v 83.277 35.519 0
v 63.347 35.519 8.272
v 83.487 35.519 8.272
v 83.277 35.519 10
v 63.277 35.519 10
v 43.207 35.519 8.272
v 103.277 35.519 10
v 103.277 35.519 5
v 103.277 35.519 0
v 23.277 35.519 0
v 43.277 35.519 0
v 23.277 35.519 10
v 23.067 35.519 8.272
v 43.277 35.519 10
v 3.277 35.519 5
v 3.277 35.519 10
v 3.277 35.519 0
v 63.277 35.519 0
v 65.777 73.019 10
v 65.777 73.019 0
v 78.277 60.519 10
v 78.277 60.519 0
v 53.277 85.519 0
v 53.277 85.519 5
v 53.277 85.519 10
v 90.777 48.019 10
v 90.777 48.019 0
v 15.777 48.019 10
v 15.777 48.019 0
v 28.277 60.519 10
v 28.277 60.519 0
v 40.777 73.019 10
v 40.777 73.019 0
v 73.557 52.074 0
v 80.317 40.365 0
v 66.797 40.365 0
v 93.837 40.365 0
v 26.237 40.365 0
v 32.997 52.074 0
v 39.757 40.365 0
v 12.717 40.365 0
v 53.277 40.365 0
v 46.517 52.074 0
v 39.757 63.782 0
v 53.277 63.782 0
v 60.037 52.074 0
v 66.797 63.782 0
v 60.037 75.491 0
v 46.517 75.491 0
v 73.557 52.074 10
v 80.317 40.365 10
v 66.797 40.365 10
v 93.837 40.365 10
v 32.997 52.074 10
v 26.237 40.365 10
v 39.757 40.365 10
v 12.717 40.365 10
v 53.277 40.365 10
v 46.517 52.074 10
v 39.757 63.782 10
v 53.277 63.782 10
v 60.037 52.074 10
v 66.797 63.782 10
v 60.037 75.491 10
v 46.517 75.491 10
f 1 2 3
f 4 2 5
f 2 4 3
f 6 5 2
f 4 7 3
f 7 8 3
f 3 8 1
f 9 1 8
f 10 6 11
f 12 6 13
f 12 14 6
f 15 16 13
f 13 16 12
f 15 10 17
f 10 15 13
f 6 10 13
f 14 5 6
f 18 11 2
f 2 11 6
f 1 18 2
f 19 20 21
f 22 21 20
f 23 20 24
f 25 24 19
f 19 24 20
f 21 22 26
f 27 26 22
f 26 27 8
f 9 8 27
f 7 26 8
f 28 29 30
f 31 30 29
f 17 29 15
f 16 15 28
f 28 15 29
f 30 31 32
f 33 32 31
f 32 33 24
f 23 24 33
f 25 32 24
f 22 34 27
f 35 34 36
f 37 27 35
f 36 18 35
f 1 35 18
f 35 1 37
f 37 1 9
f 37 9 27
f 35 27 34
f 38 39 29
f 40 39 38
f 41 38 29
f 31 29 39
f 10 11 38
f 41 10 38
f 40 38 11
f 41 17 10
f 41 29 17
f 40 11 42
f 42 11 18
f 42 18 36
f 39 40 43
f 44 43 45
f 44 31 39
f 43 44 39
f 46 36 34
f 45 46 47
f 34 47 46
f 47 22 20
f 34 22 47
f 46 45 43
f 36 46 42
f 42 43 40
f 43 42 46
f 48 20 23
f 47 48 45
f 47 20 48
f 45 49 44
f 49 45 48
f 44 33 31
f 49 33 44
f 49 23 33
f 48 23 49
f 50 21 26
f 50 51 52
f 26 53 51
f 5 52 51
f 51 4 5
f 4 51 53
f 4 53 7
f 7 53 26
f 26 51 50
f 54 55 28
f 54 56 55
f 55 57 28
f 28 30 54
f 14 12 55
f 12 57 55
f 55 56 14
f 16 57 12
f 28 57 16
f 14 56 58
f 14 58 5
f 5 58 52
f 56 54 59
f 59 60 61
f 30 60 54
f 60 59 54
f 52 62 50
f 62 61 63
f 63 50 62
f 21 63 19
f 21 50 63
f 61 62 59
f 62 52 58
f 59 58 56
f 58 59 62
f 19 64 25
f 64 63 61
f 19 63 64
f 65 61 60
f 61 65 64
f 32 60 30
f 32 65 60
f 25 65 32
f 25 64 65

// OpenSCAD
// CSG file generated from FreeCAD 0.20.29177 (Git)
group() {
 group(){
polyhedron ( points = [[3.276663,35.518578,0.000000],[3.276663,35.518578,10.000000],[103.276665,35.518578,0.000000],[103.276665,35.518578,10.000000],[53.276665,85.518578,0.000000],[53.276665,85.518578,10.000000],[3.276663,35.518578,5.000000],[103.276665,35.518578,5.000000],[23.276663,35.518578,0.000000],[43.276665,35.518578,0.000000],[63.276665,35.518578,0.000000],[83.276665,35.518578,0.000000],[23.276663,35.518578,10.000000],[43.276665,35.518578,10.000000],[63.276665,35.518578,10.000000],[83.276665,35.518578,10.000000],[53.276665,85.518578,5.000000],[90.776665,48.018578,0.000000],[78.276665,60.518578,0.000000],[65.776665,73.018578,0.000000],[90.776665,48.018578,10.000000],[78.276665,60.518578,10.000000],[65.776665,73.018578,10.000000],[40.776665,73.018578,0.000000],[28.276663,60.518578,0.000000],[15.776663,48.018578,0.000000],[40.776665,73.018578,10.000000],[28.276663,60.518578,10.000000],[15.776663,48.018578,10.000000],[83.486824,35.518578,8.272441],[63.346718,35.518578,8.272441],[43.206608,35.518578,8.272441],[23.066502,35.518578,8.272441],[93.836769,40.365093,0.000000],[66.796700,40.365093,0.000000],[39.756626,40.365093,0.000000],[12.716556,40.365093,0.000000],[53.276665,63.782482,0.000000],[73.556717,52.073788,0.000000],[80.316734,40.365093,0.000000],[32.996609,52.073788,0.000000],[26.236591,40.365093,0.000000],[53.276665,40.365093,0.000000],[46.516644,52.073788,0.000000],[39.756626,63.782482,0.000000],[60.036682,52.073788,0.000000],[66.796700,63.782482,0.000000],[60.036682,75.491180,0.000000],[46.516644,75.491180,0.000000],[93.836769,40.365093,10.000000],[66.796700,40.365093,10.000000],[39.756626,40.365093,10.000000],[12.716556,40.365093,10.000000],[53.276665,63.782482,10.000000],[73.556717,52.073788,10.000000],[80.316734,40.365093,10.000000],[32.996609,52.073788,10.000000],[26.236591,40.365093,10.000000],[53.276665,40.365093,10.000000],[46.516644,52.073788,10.000000],[39.756626,63.782482,10.000000],[60.036682,52.073788,10.000000],[66.796700,63.782482,10.000000],[60.036682,75.491180,10.000000],[46.516644,75.491180,10.000000]], faces = [[29,30,11],[14,30,15],[29,15,30],[30,14,31],[29,3,15],[29,7,3],[11,7,29],[7,11,2],[9,31,8],[32,31,12],[31,13,12],[32,1,6],[12,1,32],[0,8,6],[32,6,8],[32,8,31],[31,14,13],[30,9,10],[31,9,30],[30,10,11],[21,19,22],[19,21,18],[16,19,4],[22,16,5],[19,16,22],[20,18,21],[18,20,17],[7,17,20],[17,7,2],[7,20,3],[27,25,28],[25,27,24],[6,25,0],[28,6,1],[25,6,28],[26,24,27],[24,26,23],[16,23,26],[23,16,4],[16,26,5],[17,38,18],[34,38,39],[39,17,33],[39,10,34],[10,39,11],[33,11,39],[2,11,33],[17,2,33],[38,17,39],[25,40,41],[41,40,35],[25,41,36],[40,25,24],[41,9,8],[41,8,36],[9,41,35],[8,0,36],[0,25,36],[42,9,35],[10,9,42],[34,10,42],[43,35,40],[37,43,44],[40,24,44],[40,44,43],[38,34,45],[46,45,37],[45,46,38],[19,18,46],[46,18,38],[43,37,45],[42,45,34],[35,43,42],[45,42,43],[4,19,47],[37,47,46],[47,19,46],[44,48,37],[47,37,48],[24,23,44],[44,23,48],[23,4,48],[48,4,47],[20,21,54],[50,55,54],[55,49,20],[55,50,14],[14,15,55],[49,55,15],[3,49,15],[20,49,3],[54,55,20],[28,57,56],[57,51,56],[28,52,57],[56,27,28],[57,12,13],[57,52,12],[13,51,57],[12,52,1],[1,52,28],[58,51,13],[14,58,13],[50,58,14],[59,56,51],[53,60,59],[56,60,27],[56,59,60],[54,61,50],[62,53,61],[61,54,62],[22,62,21],[62,54,21],[59,61,53],[58,50,61],[51,58,59],[61,59,58],[5,63,22],[53,62,63],[63,62,22],[60,53,64],[63,64,53],[27,60,26],[60,64,26],[26,64,5],[64,63,5]]);
}
}
